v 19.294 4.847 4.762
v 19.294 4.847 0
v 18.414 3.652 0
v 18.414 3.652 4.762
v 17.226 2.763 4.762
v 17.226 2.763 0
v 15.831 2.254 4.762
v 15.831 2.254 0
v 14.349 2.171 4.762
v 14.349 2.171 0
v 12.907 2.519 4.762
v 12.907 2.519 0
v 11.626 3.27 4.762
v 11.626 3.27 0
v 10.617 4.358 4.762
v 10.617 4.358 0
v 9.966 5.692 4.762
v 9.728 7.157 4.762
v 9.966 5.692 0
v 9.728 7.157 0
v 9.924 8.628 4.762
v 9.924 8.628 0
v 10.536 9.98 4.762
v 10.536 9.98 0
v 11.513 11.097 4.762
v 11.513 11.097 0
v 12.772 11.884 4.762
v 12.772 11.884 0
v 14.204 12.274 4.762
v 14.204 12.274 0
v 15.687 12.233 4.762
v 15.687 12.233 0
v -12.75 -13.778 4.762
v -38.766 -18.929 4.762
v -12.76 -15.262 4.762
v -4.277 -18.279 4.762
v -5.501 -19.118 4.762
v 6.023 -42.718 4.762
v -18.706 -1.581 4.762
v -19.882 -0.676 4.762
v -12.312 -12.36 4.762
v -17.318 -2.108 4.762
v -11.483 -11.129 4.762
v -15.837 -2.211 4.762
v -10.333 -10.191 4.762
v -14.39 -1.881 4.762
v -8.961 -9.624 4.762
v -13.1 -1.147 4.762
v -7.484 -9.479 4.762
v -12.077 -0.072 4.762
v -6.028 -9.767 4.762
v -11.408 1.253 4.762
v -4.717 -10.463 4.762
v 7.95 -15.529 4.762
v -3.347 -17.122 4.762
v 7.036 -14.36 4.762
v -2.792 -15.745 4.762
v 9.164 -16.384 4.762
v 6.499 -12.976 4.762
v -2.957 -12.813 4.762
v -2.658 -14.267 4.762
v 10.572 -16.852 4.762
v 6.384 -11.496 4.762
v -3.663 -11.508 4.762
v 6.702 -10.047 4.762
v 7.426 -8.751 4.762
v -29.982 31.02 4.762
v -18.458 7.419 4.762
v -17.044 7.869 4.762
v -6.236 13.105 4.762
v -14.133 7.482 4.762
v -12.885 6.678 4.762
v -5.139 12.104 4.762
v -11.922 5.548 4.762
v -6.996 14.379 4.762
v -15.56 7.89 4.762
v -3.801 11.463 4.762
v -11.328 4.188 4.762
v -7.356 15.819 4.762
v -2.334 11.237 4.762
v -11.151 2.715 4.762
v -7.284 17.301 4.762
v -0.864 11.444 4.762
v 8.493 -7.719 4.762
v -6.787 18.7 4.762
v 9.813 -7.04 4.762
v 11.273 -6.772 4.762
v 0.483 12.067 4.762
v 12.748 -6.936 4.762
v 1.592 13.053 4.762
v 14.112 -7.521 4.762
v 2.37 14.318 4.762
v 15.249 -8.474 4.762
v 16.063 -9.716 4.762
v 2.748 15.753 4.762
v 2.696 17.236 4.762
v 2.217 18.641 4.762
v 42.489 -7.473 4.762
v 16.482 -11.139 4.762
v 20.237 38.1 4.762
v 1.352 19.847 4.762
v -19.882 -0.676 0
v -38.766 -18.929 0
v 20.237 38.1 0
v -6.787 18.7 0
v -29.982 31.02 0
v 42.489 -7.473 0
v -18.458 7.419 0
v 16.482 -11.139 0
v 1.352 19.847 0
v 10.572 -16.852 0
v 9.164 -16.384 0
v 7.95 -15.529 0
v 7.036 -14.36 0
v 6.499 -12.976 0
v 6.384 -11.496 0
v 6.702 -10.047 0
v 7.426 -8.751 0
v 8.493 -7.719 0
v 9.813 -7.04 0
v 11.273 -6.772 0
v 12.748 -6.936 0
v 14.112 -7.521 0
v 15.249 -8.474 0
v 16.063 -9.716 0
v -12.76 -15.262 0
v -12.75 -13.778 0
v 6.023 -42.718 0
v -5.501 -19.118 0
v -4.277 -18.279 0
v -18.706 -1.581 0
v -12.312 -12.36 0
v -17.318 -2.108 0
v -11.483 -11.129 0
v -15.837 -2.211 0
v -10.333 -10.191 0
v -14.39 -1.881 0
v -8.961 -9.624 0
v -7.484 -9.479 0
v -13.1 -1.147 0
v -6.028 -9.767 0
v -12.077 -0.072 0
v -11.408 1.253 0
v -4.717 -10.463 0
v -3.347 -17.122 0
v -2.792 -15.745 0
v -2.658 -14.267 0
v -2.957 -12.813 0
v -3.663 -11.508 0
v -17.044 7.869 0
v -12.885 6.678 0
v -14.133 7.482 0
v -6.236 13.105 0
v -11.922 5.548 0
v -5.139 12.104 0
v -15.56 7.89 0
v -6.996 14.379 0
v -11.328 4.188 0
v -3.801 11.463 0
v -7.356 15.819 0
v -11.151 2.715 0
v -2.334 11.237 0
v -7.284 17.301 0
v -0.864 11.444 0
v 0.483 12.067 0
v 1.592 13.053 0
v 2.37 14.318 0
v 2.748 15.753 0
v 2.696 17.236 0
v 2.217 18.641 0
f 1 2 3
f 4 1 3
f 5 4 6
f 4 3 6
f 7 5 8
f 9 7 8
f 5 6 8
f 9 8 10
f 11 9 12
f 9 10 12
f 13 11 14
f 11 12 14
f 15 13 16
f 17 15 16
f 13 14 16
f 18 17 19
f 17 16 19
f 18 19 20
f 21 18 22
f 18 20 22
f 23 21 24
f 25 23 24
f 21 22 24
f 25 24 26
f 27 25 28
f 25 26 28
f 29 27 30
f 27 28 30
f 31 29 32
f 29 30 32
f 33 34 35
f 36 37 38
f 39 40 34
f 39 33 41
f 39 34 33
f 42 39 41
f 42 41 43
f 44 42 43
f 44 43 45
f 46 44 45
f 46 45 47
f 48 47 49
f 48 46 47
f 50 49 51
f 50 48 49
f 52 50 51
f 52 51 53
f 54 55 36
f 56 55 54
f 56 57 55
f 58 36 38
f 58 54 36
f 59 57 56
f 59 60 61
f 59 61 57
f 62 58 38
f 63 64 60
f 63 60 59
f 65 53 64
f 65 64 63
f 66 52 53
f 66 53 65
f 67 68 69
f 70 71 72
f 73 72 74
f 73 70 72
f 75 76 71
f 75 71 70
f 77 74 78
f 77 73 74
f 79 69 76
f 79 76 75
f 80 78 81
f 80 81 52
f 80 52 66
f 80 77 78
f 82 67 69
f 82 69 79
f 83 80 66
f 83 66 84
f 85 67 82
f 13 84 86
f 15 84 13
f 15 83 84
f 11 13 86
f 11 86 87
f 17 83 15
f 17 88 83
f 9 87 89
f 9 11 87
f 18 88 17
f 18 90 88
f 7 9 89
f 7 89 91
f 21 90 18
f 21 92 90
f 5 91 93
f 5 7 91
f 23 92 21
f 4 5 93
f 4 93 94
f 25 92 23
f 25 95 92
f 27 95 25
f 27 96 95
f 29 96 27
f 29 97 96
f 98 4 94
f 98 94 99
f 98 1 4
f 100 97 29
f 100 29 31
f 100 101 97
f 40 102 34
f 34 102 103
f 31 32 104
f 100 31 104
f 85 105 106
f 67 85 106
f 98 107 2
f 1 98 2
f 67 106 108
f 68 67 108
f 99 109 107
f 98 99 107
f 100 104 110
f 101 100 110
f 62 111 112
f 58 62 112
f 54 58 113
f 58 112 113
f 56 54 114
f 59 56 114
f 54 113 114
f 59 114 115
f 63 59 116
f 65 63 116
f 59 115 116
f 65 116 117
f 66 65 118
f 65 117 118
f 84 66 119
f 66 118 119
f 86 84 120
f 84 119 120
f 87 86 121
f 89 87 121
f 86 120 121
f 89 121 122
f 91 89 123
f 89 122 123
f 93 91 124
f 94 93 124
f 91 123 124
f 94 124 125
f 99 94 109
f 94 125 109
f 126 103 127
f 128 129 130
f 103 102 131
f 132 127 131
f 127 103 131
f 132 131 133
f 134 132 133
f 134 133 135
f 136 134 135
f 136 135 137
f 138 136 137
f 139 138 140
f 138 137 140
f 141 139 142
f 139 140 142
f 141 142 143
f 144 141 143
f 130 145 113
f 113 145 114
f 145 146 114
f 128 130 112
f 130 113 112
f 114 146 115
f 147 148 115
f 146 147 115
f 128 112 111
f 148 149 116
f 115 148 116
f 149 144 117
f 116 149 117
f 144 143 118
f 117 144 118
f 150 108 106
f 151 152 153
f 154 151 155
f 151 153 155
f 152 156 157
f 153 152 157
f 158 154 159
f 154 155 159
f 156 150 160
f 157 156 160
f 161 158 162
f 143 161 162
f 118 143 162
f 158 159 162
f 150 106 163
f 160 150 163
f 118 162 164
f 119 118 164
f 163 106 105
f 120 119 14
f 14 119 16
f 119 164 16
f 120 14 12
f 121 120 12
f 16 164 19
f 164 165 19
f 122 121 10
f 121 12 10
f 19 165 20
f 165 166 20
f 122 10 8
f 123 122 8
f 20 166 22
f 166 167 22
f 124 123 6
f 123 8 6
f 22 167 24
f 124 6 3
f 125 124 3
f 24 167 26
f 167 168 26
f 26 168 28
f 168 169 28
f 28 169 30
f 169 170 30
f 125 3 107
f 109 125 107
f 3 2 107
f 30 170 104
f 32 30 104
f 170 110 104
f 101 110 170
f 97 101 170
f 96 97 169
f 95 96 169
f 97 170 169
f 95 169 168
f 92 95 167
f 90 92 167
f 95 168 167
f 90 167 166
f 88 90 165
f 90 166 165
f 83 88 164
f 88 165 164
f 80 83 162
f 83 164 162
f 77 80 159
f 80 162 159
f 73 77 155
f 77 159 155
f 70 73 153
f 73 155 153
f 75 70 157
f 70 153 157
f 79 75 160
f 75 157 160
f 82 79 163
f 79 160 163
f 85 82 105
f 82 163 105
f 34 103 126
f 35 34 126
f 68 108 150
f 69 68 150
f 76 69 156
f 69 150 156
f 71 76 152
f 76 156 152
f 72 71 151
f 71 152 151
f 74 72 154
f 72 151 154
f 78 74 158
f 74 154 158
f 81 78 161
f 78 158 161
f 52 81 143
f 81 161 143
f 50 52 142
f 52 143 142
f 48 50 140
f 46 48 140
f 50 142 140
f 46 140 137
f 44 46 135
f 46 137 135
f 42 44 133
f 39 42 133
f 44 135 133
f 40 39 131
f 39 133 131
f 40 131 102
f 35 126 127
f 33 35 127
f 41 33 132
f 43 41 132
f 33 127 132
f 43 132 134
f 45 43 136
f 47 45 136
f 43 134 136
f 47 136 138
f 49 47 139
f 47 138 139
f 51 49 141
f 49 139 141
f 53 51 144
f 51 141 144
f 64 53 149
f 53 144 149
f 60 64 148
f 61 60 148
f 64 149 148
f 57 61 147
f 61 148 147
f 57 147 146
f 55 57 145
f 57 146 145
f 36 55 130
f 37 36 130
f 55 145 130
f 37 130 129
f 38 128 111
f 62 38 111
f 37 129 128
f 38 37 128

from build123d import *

# Parameters (mm, degrees)
F1_DEPTH = 4.7625


# Not quite as in the source:
# - a feature of the source that left no trace in its solid (it failed there, or was rolled back) is left out


with BuildPart() as f1:
    # F0 (on Top) → F1 (new body)
    with BuildSketch(Plane.XY):
        with BuildLine():
            Line((-6.7869197201, 18.6999163445), (-29.9817704813, 31.019788517))
            Line((-29.9817704813, 31.019788517), (-18.4581812066, 7.4192113543))
            ThreePointArc((-18.4581812066, 7.4192113543), (-11.2260431578, 1.9743769297), (-19.8819508265, -0.6761522815))
            Line((-19.8819508265, -0.6761522815), (-38.7664486034, -18.9287163727))
            Line((-38.7664486034, -18.9287163727), (-12.7599809824, -15.2621111222))
            ThreePointArc((-12.7599809824, -15.2621111222), (-5.3467821599, -10.0664854729), (-5.5008016534, -19.117801436))
            Line((-5.5008016534, -19.117801436), (6.0227876213, -42.7183785987))
            Line((6.0227876213, -42.7183785987), (10.5720792637, -16.8517147679))
            ThreePointArc((10.5720792637, -16.8517147679), (7.9215500525, -8.1958070991), (16.4822684394, -11.1392987961))
            Line((16.4822684394, -11.1392987961), (42.4887360604, -7.4726935456))
            Line((42.4887360604, -7.4726935456), (19.2938852991, 4.8471786269))
            ThreePointArc((19.2938852991, 4.8471786269), (10.242569336, 5.0011981203), (15.6874037606, 12.2333361692))
            Line((15.6874037606, 12.2333361692), (20.236695403, 38.1))
            Line((20.236695403, 38.1), (1.3521976262, 19.8474359089))
            ThreePointArc((1.3521976262, 19.8474359089), (-1.5912940708, 11.286717522), (-6.7869197201, 18.6999163445))
        make_face()
    extrude(amount=F1_DEPTH)


solid = f1.part
